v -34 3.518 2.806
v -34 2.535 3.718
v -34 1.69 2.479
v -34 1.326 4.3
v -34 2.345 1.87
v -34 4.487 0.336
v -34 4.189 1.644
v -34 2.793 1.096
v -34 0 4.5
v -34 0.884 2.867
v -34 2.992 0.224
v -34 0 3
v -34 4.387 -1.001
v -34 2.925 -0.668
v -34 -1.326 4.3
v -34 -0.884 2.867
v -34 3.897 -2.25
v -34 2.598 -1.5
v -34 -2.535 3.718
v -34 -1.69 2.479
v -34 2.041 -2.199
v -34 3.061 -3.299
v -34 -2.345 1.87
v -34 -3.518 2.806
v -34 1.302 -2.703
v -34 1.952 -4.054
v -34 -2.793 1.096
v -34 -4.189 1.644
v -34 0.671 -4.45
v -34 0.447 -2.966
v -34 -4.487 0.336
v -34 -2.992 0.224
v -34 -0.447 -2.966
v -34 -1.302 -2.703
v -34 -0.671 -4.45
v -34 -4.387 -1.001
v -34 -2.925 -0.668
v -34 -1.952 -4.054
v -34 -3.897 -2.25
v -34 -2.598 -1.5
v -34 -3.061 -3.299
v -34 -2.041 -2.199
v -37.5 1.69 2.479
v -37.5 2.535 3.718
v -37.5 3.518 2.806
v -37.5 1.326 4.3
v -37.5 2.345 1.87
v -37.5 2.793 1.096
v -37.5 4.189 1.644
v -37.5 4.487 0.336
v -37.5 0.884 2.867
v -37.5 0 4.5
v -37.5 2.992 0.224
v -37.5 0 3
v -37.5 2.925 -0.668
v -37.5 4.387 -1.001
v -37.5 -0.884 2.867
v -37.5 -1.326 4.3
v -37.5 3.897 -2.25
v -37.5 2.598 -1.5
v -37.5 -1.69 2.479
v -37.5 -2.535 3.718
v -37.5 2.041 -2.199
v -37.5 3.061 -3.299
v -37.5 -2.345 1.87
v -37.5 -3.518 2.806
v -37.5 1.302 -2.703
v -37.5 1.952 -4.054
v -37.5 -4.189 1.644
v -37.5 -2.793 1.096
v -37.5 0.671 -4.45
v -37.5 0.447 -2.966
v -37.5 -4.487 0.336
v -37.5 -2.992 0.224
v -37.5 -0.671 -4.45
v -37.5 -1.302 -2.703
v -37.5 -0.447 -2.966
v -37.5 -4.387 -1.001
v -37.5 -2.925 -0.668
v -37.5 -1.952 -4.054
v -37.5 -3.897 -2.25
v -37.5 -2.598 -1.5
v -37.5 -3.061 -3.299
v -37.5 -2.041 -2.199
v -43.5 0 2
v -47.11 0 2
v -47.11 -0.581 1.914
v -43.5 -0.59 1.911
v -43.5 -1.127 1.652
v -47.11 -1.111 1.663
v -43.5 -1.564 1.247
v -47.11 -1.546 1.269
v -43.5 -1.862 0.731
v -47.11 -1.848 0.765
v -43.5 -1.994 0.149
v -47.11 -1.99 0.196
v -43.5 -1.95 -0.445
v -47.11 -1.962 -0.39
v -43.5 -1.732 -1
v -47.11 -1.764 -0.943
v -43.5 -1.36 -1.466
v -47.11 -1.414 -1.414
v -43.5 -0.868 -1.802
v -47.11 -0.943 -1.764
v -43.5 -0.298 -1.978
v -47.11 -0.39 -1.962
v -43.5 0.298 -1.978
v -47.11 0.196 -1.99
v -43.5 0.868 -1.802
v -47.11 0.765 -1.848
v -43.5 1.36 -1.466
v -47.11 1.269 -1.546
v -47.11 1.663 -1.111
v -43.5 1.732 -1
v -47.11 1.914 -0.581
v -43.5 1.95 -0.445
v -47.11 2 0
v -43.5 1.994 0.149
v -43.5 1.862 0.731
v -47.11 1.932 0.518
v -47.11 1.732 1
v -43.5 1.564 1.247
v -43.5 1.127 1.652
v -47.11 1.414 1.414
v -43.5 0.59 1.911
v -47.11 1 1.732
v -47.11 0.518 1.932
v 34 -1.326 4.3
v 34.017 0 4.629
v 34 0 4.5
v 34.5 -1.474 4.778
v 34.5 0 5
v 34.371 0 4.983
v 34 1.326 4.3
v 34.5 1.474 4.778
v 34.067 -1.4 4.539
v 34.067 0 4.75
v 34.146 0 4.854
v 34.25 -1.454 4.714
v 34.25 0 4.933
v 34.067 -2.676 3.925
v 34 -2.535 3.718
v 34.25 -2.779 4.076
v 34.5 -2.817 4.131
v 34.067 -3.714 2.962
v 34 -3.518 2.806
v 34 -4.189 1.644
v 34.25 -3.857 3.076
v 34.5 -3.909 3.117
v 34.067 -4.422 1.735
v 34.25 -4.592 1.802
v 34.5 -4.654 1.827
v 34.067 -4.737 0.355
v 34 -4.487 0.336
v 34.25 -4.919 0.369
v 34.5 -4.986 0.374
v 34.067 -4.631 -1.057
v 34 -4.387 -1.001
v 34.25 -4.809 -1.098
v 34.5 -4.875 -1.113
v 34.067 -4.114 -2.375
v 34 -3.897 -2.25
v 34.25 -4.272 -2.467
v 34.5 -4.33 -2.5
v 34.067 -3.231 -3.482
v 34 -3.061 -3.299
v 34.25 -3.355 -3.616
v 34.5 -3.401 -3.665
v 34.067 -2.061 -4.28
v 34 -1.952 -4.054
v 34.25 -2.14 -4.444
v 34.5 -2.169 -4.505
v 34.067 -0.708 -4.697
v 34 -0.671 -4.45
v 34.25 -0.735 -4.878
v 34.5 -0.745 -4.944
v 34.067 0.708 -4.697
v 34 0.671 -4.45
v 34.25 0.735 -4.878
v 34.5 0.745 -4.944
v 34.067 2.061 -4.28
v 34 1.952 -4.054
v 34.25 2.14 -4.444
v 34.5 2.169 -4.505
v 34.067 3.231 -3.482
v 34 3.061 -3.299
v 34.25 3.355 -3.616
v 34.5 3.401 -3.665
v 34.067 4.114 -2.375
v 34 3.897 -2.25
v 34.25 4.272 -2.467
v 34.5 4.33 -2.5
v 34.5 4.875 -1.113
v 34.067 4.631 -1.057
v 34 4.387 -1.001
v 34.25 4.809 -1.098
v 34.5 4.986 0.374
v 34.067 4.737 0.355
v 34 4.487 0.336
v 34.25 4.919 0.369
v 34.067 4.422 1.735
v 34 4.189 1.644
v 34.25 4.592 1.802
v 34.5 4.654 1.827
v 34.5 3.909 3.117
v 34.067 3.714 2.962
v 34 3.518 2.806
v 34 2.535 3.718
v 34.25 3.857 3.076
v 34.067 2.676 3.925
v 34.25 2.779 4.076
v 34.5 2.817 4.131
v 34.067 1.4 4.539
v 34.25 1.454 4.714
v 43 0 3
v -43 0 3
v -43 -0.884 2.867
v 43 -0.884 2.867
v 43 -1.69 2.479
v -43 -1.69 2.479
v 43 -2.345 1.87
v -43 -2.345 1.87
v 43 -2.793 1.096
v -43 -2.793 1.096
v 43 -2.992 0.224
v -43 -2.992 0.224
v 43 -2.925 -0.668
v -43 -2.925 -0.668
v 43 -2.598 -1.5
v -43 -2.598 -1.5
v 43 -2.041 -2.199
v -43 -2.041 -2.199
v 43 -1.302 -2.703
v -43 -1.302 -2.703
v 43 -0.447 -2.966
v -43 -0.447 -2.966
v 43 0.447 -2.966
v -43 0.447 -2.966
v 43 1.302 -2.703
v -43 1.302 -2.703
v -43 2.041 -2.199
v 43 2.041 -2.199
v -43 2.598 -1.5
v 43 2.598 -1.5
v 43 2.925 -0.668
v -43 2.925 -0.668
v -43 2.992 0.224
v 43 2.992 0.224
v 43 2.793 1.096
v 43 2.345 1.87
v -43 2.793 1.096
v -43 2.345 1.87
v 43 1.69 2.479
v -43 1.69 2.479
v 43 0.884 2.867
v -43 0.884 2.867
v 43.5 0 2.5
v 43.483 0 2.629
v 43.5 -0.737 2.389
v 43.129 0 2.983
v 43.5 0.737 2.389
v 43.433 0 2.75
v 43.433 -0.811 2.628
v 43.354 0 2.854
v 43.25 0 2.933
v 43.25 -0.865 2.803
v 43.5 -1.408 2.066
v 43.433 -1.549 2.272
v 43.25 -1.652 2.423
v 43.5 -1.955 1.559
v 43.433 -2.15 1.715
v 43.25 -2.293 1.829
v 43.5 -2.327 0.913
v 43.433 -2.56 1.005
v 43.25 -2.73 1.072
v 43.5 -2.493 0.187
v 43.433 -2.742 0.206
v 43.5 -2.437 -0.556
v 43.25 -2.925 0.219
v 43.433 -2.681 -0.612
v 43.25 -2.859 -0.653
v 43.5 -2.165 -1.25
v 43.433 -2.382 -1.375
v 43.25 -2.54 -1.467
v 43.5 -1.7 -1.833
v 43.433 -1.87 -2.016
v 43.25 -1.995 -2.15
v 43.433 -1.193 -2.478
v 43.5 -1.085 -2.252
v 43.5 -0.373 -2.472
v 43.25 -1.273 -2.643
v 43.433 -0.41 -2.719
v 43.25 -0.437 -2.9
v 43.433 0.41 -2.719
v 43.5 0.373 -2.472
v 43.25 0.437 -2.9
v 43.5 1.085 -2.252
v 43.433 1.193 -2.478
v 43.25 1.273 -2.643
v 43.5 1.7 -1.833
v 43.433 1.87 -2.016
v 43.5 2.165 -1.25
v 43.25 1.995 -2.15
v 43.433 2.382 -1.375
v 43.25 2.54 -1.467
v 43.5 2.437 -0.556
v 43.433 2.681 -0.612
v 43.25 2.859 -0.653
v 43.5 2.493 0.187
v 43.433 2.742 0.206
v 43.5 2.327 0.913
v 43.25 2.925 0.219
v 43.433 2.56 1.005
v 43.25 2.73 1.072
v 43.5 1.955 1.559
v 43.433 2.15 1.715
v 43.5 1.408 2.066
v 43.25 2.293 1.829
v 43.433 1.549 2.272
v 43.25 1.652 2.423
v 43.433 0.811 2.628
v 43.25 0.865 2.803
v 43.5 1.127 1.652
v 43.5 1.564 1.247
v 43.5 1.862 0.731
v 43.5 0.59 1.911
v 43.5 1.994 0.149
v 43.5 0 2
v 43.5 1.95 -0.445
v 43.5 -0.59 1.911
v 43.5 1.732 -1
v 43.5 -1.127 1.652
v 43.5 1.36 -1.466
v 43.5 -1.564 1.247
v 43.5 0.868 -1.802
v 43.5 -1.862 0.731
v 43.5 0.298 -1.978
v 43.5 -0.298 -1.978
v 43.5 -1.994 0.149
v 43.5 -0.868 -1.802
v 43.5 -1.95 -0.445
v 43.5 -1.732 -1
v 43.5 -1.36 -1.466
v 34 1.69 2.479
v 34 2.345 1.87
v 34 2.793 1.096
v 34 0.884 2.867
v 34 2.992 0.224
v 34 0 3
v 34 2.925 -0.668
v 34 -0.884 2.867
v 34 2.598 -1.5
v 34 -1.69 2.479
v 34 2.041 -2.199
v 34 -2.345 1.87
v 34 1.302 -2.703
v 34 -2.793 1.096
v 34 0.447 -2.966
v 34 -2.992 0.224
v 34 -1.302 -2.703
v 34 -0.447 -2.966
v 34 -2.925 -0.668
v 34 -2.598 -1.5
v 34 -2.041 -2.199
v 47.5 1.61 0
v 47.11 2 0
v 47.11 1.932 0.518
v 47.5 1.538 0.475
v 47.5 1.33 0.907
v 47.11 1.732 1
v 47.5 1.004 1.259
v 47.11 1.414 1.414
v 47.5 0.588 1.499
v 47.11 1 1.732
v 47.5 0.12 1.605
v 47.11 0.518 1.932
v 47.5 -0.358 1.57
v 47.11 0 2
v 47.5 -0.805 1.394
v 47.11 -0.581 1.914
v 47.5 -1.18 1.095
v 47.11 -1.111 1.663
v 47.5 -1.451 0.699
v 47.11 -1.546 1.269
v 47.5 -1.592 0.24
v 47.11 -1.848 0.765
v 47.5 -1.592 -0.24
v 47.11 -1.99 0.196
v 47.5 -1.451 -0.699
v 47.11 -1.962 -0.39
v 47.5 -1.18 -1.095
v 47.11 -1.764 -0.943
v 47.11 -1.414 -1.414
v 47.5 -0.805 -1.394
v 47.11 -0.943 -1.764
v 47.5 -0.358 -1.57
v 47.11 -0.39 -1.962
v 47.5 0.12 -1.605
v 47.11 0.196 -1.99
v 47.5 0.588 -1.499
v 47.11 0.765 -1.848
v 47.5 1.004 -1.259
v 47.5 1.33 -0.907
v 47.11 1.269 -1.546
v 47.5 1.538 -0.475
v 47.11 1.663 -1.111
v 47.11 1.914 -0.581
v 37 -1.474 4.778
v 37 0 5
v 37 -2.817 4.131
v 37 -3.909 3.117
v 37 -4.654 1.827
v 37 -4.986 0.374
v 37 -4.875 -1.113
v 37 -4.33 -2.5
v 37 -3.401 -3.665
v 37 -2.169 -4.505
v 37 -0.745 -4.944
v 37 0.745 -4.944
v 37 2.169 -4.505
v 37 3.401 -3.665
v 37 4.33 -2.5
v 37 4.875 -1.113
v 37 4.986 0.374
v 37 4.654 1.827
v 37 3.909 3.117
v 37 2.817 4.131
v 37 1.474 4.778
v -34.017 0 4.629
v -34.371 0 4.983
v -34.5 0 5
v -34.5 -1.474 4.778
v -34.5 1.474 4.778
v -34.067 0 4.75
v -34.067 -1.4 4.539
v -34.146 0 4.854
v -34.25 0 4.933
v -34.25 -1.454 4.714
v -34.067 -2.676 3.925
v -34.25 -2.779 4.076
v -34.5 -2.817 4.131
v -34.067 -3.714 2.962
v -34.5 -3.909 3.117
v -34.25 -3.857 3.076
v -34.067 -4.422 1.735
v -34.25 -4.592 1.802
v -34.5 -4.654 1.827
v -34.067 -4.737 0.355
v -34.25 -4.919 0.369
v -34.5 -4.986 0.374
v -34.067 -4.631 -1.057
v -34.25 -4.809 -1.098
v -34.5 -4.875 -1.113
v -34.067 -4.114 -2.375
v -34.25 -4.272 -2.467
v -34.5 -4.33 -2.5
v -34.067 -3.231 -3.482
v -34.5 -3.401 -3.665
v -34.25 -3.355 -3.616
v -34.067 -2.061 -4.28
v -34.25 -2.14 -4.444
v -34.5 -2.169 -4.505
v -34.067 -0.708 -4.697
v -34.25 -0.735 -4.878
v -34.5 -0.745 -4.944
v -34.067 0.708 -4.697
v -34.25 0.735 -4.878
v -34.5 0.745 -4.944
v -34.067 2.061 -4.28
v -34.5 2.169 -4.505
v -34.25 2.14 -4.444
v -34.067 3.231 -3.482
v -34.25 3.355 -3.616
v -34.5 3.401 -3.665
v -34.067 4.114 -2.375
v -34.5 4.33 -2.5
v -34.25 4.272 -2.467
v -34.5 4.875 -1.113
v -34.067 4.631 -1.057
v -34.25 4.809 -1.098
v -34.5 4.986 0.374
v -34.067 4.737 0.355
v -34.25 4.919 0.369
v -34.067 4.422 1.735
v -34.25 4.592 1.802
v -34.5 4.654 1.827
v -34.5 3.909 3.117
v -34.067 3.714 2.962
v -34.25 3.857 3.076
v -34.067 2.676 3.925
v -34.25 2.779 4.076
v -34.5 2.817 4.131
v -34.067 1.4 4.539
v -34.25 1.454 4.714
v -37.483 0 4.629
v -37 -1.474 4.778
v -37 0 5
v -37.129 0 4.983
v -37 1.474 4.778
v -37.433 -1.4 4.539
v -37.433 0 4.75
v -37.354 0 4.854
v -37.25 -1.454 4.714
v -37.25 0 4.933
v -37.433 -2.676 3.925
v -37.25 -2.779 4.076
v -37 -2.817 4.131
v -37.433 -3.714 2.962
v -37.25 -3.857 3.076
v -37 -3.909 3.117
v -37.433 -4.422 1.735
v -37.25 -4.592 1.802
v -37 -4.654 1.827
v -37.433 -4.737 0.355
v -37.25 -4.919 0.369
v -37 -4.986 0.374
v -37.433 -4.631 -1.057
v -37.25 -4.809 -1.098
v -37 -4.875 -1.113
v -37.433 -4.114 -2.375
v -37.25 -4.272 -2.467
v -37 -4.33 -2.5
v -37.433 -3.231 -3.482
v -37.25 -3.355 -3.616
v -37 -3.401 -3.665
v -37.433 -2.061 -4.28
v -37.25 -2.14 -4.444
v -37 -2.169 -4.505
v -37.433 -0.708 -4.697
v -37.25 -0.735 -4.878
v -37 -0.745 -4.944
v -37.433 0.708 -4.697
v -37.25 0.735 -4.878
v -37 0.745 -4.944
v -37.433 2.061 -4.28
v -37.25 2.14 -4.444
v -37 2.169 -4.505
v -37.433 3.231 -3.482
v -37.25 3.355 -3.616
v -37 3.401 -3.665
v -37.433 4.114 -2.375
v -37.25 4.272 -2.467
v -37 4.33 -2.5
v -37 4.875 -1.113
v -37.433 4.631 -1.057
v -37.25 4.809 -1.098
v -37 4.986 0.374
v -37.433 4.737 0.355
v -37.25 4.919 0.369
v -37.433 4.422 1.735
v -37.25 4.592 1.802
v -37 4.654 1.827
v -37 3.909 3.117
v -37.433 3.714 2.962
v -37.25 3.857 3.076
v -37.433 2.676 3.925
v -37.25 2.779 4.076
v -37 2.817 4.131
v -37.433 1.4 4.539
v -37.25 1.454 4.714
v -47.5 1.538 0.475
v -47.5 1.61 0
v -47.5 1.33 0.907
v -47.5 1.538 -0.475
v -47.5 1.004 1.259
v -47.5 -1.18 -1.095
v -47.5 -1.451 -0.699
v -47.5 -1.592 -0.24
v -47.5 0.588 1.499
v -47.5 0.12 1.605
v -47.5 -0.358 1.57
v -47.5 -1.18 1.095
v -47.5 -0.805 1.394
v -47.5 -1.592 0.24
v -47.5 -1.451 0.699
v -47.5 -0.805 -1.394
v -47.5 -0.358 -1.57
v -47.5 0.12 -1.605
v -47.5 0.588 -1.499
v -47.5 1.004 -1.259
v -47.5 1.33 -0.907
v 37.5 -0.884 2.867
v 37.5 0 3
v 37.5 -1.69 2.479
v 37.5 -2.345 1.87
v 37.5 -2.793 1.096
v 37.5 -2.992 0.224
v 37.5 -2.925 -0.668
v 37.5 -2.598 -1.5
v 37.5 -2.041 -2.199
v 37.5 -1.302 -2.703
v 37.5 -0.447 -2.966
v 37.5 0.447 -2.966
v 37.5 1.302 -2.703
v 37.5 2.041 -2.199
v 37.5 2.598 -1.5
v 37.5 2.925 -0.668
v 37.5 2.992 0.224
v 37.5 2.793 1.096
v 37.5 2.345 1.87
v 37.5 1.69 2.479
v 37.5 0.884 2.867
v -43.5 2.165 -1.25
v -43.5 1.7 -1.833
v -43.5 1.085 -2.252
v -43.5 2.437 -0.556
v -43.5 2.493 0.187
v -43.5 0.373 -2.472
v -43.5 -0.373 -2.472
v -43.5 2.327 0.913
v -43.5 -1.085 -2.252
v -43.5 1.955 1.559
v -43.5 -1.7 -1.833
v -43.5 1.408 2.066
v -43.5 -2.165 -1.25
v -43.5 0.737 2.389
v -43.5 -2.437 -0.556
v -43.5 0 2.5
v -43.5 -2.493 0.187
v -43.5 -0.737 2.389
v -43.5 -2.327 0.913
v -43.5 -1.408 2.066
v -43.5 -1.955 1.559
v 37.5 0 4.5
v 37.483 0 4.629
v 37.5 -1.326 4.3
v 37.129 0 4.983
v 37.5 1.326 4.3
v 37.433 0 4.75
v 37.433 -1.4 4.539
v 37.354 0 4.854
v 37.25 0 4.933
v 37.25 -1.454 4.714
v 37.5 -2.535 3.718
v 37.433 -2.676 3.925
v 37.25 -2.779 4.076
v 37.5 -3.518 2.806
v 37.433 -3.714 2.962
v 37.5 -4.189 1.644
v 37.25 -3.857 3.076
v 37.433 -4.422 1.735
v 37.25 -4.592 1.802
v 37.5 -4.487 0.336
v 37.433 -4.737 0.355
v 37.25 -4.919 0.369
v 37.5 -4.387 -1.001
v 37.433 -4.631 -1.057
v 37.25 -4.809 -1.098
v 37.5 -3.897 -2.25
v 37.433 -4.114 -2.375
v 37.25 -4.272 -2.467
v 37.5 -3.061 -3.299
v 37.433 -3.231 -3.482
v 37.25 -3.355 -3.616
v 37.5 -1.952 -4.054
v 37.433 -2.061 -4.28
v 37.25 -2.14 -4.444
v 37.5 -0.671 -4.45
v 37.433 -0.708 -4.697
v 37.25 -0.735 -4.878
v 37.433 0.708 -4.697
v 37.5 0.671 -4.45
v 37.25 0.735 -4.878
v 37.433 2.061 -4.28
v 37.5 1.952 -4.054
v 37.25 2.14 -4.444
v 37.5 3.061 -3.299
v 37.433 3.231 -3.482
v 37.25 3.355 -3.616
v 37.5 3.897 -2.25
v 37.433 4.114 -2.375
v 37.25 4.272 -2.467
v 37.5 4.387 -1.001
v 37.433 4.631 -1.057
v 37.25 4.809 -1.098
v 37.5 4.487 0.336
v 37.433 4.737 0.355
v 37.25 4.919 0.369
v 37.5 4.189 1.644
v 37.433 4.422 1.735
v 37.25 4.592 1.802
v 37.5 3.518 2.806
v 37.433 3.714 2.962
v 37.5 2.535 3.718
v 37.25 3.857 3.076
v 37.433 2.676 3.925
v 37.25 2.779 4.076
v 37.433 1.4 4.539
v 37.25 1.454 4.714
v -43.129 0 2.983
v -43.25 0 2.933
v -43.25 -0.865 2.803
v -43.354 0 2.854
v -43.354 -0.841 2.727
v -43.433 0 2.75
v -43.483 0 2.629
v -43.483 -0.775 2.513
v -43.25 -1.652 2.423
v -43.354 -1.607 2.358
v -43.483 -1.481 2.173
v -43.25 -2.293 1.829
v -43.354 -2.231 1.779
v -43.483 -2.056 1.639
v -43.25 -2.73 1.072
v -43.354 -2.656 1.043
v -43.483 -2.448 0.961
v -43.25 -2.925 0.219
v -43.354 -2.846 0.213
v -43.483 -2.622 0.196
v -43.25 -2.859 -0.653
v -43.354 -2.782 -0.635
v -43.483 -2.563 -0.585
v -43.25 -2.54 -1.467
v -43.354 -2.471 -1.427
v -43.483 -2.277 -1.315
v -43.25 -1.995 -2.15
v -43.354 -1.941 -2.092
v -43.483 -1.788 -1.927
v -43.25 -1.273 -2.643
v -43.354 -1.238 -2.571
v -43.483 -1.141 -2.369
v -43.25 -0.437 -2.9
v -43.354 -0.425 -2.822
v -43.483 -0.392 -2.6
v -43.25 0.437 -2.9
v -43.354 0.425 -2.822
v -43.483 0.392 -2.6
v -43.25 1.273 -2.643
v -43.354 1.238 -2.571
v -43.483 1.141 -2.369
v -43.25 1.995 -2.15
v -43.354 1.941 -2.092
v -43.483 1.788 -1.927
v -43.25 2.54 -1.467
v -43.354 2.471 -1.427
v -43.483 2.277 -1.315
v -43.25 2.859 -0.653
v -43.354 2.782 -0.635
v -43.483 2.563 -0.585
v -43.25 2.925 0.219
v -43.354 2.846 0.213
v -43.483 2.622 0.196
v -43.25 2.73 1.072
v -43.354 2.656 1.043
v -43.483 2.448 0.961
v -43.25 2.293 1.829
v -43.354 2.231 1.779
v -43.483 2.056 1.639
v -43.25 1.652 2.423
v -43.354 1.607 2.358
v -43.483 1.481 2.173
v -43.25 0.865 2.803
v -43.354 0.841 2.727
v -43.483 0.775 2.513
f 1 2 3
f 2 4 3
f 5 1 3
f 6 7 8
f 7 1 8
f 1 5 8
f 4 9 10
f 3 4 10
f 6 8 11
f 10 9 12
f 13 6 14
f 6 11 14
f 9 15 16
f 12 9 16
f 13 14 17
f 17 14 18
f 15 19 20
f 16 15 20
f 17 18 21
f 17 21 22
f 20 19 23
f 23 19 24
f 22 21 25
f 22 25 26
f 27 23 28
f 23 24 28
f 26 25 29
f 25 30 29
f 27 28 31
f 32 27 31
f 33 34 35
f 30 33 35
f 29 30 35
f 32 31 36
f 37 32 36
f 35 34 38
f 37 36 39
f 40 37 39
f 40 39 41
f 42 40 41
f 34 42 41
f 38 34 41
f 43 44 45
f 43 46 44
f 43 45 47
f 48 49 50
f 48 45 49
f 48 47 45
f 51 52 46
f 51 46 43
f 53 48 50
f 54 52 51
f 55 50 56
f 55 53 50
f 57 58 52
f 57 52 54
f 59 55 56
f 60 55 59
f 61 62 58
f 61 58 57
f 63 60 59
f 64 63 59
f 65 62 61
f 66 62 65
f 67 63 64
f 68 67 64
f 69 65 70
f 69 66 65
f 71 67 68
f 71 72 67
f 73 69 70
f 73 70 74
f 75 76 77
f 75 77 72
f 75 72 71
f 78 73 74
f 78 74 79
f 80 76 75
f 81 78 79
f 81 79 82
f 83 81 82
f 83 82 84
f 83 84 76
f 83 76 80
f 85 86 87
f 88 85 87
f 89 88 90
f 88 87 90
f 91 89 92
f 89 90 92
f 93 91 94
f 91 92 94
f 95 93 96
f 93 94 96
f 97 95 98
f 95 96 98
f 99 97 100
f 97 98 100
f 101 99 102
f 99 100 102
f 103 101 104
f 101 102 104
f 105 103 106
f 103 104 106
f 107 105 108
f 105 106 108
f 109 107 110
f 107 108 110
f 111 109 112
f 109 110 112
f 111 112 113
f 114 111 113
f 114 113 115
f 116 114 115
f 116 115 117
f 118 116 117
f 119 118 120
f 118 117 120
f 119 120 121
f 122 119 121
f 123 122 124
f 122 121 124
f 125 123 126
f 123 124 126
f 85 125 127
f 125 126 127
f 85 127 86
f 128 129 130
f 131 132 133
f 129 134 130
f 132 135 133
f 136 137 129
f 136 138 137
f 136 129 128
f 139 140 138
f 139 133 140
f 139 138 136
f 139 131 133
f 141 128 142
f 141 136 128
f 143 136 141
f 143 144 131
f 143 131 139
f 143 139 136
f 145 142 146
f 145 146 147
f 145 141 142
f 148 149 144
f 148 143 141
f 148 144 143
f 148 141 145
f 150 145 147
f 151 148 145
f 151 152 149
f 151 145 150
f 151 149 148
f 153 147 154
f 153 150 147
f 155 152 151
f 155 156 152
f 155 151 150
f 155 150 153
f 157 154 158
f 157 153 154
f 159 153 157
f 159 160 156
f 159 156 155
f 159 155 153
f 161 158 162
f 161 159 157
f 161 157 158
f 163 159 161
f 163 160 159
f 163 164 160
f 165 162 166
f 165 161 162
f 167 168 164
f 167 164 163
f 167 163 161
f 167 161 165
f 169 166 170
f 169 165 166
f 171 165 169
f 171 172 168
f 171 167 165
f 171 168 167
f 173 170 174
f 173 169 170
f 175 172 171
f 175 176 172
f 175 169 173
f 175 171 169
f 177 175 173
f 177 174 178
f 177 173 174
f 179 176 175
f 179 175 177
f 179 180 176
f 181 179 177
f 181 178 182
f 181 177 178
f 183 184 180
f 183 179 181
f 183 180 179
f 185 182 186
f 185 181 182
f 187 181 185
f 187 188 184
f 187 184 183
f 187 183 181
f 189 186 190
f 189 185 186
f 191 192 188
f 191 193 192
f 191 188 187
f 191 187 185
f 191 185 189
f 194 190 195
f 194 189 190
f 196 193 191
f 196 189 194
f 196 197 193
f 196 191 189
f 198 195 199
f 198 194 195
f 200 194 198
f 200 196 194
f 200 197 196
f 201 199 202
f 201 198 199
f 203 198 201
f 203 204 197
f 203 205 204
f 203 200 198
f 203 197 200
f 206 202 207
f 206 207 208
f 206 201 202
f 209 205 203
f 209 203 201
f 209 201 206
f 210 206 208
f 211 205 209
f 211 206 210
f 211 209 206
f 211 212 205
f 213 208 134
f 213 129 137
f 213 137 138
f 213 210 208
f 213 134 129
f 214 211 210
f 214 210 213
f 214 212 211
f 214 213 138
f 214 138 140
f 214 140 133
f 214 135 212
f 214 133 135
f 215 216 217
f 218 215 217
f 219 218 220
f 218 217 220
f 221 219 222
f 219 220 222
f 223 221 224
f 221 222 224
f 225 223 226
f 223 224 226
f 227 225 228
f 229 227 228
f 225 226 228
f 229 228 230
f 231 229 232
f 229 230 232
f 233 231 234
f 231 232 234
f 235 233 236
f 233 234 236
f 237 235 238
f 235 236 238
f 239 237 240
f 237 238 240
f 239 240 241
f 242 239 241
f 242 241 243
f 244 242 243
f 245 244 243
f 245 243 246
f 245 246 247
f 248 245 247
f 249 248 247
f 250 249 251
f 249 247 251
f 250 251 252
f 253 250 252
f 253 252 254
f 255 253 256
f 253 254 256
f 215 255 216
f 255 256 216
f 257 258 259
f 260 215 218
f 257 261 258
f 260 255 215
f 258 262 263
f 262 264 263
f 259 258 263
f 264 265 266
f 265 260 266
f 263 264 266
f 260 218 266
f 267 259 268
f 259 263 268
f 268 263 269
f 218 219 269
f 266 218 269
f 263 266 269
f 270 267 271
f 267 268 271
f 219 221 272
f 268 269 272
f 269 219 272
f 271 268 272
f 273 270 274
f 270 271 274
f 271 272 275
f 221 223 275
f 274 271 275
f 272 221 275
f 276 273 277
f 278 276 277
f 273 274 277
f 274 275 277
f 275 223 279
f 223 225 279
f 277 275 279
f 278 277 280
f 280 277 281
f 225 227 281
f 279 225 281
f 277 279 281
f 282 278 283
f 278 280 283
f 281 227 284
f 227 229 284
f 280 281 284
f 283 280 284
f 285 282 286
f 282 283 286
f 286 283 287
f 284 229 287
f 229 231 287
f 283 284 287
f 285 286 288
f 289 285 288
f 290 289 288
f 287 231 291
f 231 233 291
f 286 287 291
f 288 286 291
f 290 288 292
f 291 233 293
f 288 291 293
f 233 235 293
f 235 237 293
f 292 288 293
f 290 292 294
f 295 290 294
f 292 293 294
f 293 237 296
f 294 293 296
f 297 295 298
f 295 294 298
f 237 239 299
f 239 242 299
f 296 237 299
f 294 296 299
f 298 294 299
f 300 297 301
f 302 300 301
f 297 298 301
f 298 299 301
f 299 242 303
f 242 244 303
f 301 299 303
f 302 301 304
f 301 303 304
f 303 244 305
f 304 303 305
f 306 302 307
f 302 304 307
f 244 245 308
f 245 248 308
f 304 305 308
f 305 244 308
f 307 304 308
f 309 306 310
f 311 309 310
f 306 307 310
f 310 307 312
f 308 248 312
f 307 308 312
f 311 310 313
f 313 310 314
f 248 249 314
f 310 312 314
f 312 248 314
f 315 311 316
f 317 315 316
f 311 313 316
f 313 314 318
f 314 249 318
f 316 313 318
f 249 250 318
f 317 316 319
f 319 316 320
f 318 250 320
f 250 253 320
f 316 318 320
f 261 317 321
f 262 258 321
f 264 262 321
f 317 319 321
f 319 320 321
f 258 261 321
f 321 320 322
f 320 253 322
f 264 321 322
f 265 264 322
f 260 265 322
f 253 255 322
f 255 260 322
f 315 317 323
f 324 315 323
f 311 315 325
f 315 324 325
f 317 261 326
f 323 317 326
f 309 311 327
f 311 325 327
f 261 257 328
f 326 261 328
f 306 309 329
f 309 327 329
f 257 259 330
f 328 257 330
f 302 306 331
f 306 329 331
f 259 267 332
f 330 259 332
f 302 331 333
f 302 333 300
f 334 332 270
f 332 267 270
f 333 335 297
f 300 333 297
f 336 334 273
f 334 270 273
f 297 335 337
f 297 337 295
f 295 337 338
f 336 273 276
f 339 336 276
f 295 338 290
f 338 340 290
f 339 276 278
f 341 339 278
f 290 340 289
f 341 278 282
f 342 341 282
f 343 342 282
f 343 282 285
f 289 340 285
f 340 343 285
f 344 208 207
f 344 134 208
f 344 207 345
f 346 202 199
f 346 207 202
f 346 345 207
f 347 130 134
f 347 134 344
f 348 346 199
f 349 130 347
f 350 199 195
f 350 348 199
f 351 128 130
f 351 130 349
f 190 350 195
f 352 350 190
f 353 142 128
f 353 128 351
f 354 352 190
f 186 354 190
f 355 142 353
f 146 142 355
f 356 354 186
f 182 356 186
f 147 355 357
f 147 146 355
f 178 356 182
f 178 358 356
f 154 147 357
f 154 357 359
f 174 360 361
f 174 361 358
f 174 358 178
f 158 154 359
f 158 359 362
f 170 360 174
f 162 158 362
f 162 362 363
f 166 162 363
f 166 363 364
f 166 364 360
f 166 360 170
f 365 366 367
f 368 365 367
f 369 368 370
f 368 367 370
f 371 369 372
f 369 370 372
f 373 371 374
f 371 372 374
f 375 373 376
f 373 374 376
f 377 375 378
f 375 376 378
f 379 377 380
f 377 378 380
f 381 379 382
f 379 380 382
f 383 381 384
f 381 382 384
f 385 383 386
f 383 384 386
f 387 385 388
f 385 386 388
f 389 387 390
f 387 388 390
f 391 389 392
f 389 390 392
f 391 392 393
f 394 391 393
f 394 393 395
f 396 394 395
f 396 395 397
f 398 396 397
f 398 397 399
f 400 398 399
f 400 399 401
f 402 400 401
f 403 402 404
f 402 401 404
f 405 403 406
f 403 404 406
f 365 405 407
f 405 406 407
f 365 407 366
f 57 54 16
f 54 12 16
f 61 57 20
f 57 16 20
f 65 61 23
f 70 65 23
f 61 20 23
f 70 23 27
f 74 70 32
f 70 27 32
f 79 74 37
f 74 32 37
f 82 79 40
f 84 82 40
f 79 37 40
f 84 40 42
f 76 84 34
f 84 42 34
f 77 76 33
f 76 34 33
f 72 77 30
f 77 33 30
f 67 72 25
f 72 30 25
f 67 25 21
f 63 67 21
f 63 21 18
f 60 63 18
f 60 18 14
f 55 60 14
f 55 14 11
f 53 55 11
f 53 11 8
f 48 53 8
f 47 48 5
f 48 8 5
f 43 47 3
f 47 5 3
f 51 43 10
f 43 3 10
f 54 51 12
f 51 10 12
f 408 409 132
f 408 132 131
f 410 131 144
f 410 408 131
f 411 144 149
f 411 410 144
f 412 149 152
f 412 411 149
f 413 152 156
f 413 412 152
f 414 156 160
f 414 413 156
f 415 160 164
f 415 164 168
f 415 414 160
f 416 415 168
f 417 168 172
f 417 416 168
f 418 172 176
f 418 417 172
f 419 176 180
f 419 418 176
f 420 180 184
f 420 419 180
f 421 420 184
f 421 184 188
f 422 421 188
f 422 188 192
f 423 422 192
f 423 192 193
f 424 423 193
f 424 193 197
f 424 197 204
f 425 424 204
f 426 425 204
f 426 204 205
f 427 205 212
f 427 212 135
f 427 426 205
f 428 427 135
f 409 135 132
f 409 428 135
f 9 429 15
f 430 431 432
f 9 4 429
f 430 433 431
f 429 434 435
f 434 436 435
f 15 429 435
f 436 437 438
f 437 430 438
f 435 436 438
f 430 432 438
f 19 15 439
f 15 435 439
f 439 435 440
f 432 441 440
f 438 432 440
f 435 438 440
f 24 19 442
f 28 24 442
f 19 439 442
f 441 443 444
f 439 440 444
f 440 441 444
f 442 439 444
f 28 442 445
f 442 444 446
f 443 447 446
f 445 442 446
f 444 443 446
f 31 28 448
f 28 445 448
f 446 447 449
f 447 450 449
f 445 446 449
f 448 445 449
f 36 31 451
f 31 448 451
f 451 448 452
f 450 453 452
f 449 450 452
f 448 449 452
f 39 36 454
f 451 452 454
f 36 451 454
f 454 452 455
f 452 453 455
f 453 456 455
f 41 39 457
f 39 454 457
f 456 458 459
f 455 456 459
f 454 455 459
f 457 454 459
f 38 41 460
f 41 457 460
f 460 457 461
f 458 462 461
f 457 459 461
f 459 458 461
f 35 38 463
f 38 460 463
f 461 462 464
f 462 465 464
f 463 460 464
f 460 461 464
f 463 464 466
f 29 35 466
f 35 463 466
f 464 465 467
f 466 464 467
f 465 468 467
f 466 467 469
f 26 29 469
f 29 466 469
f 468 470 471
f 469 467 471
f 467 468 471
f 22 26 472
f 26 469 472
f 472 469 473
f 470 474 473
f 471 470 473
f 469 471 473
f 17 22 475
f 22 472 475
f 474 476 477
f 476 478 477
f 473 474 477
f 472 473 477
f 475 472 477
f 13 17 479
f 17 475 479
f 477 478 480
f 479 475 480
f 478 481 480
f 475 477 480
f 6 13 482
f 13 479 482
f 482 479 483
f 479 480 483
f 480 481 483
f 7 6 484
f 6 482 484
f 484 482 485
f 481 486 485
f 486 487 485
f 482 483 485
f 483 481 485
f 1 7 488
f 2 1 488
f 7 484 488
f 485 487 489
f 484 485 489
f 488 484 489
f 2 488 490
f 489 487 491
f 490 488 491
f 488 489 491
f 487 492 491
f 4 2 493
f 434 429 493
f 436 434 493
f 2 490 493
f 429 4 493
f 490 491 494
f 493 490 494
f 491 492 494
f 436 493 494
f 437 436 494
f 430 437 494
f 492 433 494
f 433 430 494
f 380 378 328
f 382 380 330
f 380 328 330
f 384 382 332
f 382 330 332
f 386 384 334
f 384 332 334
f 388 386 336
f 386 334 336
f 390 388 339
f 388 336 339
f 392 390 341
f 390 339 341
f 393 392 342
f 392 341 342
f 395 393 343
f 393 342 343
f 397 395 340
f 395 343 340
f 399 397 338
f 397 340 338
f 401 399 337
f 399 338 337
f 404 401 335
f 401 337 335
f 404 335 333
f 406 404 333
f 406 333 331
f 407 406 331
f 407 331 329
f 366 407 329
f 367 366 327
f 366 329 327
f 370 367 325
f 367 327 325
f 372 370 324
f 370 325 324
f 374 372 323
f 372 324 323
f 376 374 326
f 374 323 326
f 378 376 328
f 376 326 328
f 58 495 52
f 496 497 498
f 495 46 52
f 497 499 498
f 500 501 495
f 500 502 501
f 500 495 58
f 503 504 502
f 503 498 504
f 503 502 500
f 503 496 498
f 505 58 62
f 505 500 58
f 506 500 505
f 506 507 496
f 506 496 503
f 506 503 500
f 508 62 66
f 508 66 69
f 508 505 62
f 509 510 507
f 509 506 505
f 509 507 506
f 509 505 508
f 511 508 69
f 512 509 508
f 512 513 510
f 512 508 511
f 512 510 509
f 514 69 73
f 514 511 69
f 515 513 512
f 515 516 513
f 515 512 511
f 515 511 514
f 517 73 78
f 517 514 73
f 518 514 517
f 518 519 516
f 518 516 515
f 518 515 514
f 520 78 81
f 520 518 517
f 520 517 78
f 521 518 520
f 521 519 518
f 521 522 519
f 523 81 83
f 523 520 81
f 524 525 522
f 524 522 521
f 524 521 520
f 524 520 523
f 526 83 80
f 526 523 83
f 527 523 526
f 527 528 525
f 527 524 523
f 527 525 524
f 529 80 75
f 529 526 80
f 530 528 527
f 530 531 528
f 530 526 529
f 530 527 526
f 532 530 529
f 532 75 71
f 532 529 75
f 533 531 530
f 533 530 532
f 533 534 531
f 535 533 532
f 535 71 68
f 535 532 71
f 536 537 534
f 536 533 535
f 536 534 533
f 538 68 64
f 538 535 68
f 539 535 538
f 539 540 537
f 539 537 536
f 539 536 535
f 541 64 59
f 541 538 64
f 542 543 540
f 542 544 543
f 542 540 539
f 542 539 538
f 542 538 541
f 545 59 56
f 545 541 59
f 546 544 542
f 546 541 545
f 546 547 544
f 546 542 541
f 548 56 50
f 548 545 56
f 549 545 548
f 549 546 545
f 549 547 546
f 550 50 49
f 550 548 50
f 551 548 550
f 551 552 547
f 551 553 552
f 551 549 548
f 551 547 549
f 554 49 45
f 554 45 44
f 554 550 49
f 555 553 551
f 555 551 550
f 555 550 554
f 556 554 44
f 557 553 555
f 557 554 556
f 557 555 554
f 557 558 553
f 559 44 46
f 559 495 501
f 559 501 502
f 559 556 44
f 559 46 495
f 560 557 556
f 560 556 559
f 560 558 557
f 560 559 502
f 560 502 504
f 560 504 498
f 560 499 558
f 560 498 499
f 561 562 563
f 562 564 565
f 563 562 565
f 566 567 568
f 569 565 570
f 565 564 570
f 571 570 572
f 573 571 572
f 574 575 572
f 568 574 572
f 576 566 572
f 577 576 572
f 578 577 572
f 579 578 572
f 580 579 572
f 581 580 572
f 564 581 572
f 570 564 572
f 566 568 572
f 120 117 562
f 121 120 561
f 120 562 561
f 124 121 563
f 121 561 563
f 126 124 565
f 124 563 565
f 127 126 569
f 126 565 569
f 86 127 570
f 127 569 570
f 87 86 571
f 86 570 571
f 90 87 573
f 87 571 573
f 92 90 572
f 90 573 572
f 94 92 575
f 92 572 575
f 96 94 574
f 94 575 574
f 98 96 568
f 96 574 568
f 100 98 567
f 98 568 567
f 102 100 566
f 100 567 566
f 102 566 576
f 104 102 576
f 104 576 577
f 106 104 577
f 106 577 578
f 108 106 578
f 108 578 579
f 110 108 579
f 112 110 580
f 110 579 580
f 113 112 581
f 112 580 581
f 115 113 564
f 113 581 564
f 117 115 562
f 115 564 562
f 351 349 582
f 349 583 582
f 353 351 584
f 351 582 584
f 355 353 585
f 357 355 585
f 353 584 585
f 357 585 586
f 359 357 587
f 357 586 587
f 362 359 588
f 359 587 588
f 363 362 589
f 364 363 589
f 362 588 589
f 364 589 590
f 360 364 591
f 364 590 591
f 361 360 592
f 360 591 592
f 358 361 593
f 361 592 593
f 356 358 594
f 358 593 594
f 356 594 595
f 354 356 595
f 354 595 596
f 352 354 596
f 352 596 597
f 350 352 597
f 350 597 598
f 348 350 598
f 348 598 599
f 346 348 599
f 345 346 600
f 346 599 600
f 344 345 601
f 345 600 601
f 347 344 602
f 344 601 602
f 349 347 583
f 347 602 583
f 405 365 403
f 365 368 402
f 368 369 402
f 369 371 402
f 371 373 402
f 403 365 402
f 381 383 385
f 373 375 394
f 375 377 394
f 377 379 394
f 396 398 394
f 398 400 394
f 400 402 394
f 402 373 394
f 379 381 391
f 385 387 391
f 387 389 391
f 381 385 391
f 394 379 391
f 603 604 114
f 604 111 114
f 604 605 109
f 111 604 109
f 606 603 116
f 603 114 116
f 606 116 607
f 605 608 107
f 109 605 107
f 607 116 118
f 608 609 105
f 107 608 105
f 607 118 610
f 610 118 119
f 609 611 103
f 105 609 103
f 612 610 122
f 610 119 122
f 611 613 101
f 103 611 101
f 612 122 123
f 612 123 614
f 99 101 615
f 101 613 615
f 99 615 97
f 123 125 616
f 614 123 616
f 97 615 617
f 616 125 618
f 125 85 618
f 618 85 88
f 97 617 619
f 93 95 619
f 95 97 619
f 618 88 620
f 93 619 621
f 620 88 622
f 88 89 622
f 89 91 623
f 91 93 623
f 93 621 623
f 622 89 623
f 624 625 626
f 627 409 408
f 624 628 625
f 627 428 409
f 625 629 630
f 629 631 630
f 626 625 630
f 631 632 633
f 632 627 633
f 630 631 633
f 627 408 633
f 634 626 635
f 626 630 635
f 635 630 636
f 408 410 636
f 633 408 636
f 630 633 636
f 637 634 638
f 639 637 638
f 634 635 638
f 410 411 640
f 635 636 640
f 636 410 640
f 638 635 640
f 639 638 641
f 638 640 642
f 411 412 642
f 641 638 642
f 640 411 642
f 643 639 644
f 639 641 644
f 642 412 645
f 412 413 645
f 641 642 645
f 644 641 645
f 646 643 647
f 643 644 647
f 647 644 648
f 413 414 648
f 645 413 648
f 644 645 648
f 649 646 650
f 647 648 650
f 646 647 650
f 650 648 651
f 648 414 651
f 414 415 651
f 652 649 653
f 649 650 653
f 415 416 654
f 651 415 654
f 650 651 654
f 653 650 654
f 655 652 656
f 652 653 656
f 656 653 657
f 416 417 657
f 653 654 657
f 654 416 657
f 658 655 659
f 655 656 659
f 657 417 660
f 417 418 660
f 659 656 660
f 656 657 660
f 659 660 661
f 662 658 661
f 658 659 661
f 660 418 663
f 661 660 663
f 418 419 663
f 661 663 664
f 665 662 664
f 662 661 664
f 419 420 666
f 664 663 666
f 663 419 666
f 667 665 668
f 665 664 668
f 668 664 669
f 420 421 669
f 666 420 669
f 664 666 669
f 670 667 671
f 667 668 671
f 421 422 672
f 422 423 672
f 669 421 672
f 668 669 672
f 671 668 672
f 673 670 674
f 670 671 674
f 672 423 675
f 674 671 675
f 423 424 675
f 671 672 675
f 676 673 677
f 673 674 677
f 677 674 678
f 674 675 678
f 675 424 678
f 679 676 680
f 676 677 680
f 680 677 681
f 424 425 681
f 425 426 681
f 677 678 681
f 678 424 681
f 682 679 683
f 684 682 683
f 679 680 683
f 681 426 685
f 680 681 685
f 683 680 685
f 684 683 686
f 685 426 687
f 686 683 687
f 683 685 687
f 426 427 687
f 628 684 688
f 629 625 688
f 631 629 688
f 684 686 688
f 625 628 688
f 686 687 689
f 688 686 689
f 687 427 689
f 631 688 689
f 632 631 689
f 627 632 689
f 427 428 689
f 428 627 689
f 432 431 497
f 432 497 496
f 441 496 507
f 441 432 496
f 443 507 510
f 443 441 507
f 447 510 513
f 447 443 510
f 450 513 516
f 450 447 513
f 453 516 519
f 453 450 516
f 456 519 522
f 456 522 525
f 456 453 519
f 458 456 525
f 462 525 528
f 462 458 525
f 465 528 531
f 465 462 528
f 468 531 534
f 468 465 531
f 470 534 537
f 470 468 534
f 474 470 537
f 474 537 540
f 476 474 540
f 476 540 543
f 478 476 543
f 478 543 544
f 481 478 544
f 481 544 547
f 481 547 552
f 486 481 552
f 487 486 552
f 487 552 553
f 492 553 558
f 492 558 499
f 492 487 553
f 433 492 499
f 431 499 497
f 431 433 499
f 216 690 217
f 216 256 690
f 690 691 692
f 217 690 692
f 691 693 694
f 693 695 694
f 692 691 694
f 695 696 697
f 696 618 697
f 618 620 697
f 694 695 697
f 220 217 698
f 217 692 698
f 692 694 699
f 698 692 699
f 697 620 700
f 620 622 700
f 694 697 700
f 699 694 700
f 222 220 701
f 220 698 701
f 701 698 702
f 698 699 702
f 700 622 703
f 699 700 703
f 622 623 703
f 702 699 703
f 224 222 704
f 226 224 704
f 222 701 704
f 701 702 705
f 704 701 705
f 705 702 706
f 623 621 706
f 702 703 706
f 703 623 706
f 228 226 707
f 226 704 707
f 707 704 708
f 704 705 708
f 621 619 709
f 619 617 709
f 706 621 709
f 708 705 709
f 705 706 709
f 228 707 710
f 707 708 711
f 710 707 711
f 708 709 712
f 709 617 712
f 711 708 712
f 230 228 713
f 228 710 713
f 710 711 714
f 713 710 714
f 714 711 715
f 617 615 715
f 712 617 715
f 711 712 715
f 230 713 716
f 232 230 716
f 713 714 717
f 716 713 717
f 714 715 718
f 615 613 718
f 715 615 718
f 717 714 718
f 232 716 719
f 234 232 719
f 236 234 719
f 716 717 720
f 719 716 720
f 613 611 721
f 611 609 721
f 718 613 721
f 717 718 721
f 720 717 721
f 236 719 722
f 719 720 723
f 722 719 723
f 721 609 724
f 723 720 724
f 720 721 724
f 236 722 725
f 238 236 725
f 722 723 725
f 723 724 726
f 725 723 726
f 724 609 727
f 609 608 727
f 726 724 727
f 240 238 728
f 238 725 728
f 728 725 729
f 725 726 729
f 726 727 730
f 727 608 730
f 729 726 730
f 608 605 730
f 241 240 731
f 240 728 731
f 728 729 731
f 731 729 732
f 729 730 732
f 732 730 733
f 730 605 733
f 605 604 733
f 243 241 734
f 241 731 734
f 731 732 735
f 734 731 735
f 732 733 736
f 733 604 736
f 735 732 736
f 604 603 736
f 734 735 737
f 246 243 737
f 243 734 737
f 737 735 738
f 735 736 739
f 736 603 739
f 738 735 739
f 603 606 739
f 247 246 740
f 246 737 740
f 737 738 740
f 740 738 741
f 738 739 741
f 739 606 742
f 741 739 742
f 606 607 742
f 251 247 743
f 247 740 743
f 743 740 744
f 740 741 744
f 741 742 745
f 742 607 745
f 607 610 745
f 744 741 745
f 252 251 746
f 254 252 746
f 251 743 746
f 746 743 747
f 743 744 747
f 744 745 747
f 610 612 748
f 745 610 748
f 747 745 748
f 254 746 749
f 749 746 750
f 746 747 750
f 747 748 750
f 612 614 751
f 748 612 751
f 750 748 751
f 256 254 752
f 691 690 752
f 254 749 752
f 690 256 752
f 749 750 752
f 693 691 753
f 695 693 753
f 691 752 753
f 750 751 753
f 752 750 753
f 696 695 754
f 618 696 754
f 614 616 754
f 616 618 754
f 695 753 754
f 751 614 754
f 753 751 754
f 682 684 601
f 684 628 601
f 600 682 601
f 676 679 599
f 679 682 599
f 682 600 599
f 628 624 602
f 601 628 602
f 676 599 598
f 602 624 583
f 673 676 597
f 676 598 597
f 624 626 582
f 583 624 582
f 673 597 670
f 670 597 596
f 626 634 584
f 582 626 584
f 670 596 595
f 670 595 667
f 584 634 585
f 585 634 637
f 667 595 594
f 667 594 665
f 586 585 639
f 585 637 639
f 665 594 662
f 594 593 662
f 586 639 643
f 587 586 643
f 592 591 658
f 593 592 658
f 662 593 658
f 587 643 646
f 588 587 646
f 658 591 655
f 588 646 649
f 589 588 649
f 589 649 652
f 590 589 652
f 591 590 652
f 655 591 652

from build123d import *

# Parameters (mm, degrees)
SKETCH2_W = 3.5
SKETCH2_H = 2
FILLET1_R = 0.5
FILLET2_R = 0.5
FILLET3_R = 0.5


# Read off the part's stored shape, not the designer's step: M4x0.7 Machine Threads Stud1, M4x0.7 Machine Threads Stud2
with BuildPart() as part:
    # Sketch1 → Revolve1 (revolve)
    with BuildSketch(Plane.XY, mode=Mode.PRIVATE) as revolve1_sk:
        Polygon((47.5, 0), (47.5, 2), (43.5, 2), (43.5, 3), (-43.5, 3), (-43.5, 2), (-47.5, 2), (-47.5, 0), align=None)
    revolve(revolve1_sk.sketch.rotate(Axis((-51.987746382, 0, 0), (1, 0, 0)), 90), axis=Axis((-51.987746382, 0, 0), (1, 0, 0)))

    # M4x0.7 Machine Threads Stud1 outline → M4x0.7 Machine Threads Stud1 (revolve, cut)
    with BuildSketch(Plane.YX):
        Polygon((2, 47.5), (1.61, 47.5), (2, 47.11), align=None)
    revolve(axis=Axis((0, 0, 0), (1, 0, 0)), mode=Mode.SUBTRACT)

    # M4x0.7 Machine Threads Stud2 outline → M4x0.7 Machine Threads Stud2 (revolve, cut)
    with BuildSketch(Plane.YX):
        Polygon((2, -47.11), (1.61, -47.5), (2, -47.5), align=None)
    revolve(axis=Axis((0, 0, 0), (1, 0, 0)), mode=Mode.SUBTRACT)

    # Fillet3
    fillet3_edges = [part.edges().sort_by_distance(p)[0] for p in [
        (-43.5, 0, -3),
        (43.5, 0, -3),
    ]]
    fillet(fillet3_edges, radius=FILLET3_R)


with BuildPart() as body_2:
    # Sketch2 → Revolve2 (revolve)
    with BuildSketch(Plane.XY, mode=Mode.PRIVATE) as revolve2_sk:
        with Locations((-35.75, 4)):
            Rectangle(SKETCH2_W, SKETCH2_H)
        with Locations((35.75, 4)):
            Rectangle(SKETCH2_W, SKETCH2_H)
    revolve(revolve2_sk.sketch.rotate(Axis((-51.987746382, 0, 0), (1, 0, 0)), 90), axis=Axis((-51.987746382, 0, 0), (1, 0, 0)))

    # Fillet1
    fillet1_edges = [body_2.edges().sort_by_distance(p)[0] for p in [
        (-34, 0, -5),
        (-37.5, 0, -5),
    ]]
    fillet(fillet1_edges, radius=FILLET1_R)

    # Fillet2
    fillet2_edges = [body_2.edges().sort_by_distance(p)[0] for p in [
        (37.5, 0, -5),
        (34, 0, -5),
    ]]
    fillet(fillet2_edges, radius=FILLET2_R)


solid = Compound([part.part, body_2.part])
